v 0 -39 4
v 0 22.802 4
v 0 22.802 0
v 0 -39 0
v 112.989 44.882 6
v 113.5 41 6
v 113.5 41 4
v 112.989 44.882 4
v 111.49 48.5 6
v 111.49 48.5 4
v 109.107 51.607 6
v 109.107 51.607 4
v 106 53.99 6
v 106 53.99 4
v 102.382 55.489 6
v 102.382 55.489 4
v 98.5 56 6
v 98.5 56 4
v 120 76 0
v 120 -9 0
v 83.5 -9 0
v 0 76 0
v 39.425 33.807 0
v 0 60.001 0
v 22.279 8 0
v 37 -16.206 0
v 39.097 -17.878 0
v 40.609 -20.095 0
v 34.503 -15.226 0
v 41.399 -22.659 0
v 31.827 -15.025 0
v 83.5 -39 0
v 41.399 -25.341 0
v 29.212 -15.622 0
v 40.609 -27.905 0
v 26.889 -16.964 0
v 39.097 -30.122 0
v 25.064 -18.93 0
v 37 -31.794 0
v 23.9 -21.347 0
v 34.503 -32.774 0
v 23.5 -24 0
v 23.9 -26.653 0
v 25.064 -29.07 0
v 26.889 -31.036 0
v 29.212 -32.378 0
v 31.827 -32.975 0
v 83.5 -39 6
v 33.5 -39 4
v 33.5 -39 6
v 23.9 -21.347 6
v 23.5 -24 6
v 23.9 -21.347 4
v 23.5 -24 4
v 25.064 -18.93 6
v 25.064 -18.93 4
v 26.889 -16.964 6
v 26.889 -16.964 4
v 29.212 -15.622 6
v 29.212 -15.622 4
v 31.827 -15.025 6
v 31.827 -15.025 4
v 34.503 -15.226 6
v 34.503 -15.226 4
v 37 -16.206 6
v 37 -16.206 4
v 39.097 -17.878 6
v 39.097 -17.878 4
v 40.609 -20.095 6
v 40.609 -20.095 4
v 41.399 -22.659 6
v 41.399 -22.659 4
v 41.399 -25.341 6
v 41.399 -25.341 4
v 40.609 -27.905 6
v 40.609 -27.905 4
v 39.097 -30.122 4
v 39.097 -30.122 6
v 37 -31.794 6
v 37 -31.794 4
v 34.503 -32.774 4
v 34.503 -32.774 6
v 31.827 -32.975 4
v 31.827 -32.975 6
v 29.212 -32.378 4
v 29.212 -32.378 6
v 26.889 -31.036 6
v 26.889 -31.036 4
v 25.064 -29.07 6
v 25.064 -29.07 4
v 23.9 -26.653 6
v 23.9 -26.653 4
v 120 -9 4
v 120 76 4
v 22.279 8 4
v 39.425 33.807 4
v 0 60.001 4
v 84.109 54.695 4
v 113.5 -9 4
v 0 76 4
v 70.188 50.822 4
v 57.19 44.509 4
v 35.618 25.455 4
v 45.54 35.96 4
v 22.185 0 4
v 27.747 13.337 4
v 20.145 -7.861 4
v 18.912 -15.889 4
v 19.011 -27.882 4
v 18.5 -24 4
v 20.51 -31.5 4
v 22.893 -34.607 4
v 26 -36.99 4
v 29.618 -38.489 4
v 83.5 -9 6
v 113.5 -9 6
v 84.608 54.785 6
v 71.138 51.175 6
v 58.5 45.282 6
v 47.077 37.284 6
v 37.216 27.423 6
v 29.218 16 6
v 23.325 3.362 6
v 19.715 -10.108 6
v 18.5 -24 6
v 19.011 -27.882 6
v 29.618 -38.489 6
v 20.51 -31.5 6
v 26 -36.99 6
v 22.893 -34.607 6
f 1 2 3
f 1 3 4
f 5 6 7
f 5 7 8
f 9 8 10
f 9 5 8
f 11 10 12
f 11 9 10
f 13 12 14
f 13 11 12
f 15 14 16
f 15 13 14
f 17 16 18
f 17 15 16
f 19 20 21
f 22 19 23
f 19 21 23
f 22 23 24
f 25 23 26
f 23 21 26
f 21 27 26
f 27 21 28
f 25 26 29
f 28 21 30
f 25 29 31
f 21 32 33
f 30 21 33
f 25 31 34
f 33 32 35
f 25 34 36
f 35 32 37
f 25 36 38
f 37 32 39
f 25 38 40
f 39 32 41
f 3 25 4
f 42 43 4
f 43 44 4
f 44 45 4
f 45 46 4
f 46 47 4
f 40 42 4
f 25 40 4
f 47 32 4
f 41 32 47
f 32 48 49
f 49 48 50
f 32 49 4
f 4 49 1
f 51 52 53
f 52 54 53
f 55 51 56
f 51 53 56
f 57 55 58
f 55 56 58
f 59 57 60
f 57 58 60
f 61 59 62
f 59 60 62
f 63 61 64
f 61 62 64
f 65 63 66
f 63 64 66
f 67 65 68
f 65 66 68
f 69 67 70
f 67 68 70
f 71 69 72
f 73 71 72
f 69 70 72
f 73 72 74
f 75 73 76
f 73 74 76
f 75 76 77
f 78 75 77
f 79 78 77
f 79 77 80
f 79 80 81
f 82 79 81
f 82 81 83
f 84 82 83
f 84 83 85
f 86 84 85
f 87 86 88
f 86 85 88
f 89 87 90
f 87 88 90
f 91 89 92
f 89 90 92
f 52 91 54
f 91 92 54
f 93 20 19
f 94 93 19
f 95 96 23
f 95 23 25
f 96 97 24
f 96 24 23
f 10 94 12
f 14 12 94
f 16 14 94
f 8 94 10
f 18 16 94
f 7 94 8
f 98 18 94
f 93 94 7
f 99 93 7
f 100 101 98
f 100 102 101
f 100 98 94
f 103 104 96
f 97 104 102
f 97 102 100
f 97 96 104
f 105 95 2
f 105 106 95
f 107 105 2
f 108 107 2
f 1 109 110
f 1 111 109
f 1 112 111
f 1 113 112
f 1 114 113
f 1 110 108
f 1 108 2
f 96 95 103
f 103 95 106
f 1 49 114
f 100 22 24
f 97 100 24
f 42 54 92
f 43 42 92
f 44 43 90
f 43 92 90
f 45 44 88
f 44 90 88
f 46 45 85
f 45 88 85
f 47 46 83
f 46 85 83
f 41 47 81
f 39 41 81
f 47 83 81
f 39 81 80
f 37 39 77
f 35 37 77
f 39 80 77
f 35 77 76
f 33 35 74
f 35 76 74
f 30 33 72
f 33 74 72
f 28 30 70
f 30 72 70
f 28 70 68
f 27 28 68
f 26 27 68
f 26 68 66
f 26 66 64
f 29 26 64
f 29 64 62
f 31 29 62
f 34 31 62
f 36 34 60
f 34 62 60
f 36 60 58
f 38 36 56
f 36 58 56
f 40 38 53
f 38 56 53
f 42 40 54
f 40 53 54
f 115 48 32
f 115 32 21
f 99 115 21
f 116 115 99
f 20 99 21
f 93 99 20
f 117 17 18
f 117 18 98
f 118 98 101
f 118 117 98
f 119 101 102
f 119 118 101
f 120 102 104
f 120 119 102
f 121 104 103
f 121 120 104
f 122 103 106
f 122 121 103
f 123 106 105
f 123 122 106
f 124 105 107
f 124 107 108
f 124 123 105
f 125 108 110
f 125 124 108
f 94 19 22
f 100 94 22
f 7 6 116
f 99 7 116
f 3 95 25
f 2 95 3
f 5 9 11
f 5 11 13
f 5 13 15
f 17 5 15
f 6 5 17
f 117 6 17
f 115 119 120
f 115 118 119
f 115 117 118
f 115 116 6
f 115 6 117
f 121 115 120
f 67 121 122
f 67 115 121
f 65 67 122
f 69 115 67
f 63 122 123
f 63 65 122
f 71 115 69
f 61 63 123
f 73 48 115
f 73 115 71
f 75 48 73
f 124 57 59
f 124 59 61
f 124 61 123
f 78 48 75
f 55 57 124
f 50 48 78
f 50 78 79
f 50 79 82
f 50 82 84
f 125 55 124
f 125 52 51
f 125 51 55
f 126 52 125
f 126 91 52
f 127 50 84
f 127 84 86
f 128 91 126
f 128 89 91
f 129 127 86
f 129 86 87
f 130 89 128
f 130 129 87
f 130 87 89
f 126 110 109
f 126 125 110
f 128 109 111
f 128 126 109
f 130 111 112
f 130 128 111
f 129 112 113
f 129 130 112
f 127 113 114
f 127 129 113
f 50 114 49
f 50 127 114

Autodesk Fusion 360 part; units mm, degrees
sketch "Colour Detection Mechanism Platform" plane through (0, 0, 0) normal (0, 0, 1) x (1, 0, 0)
  line L0 (0, 0) -> (120, 0)
  line L1 (120, 0) -> (120, 76)
  line L2 (120, 76) -> (0, 76)
  line L3 (0, 76) -> (0, 0)
  dimension "d169" = 120
  dimension "d170" = 76
extrude "Extrude42" add sketch "Colour Detection Mechanism Platform" along normal blind 4
sketch "Smartie Path" plane through (0, 0, 4) normal (0, 0, 1) x (-1, 0, 0)
  line L0 (0, -76) -> (0, 0)
  line L1 (0, 0) -> (-120, 0)
  line L2 (-120, 0) -> (-120, -76)
  line L3 (-120, -76) -> (0, -76)
  circle A0 centre (-98.5, 24) radius 80
  line L4 (-98.5, 24) -> (-113.5, 24)
  line L5 (-113.5, 24) -> (-113.5, -56)
  line L6 (-113.5, -56) -> (-98.5, -56)
  line L7 (-98.5, -56) -> (-98.5, 24)
  line L8 (-98.5, 24) -> (-18.5, 24)
  line L9 (-18.5, 24) -> (-18.5, 39)
  line L10 (-18.5, 39) -> (-98.5, 39)
  line L11 (-98.5, 39) -> (-98.5, 24)
  line L12 (-98.5, 24) -> (-113.5, 24)
  line L13 (-113.5, 24) -> (-113.5, 39)
  line L14 (-113.5, 39) -> (-98.5, 39)
  line L15 (-98.5, 39) -> (-98.5, 24)
  circle A1 centre (-32.5, 24) radius 9
  dimension "d173" = 160
  dimension "d174" = 24
  dimension "d175" = 21.5
  dimension "d176" = 15
  dimension "d177" = 15
  dimension "d178" = 80
  dimension "d179" = 80
  dimension "d184" = 18
  dimension "d185" = 14
extrude "Extrude43" add sketch "Smartie Path" along normal blind 2 contours L1 A0 L7 | L1 A0 L7 L8 A1 | L1 A0 L5 L7 | L1 L4 L5 L7 L12 | A0 L8 L10 L11 L15 A1 | L4 L11 L12 L13 L14 L15
fillet "Fillet2" radius 15 2 edges at (19.9188, -39, 5) (113.5, 54.5812, 5)
extrude "Extrude44" add 1 faces at (89.4665, -20.5529, 4) along direction (0, 0, -1) blind 4
sketch "Servo Hole" plane through (0, 0, 6) normal (0, 0, 1) x (-1, 0, 0)
  circle A0 centre (-32.5, 24) radius 9
  arc A1 (-113.5, -41) -> (-98.5, -56) centre (-98.5, -41) ccw
  arc A2 (-98.5, -56) -> (-18.5, 24) centre (-98.5, 24) ccw
  arc A3 (-18.5, 24) -> (-33.5, 39) centre (-33.5, 24) ccw
  line L0 (-33.5, 39) -> (-113.5, 39)
  line L1 (-113.5, 39) -> (-113.5, -41)
  line L2 (-113.5, 39) -> (-83.5, 39)
  line L3 (-83.5, 39) -> (-83.5, 9)
  line L4 (-83.5, 9) -> (-113.5, 9)
  line L5 (-113.5, 9) -> (-113.5, 39)
  dimension "d188" = 30
  dimension "d189" = 30
extrude "Extrude45" cut sketch "Servo Hole" against normal blind 6 contours L0 L1 L2 L3 L4 L5
sketch "Colour Sensor Holder Hole" plane through (0, 0, 4) normal (0, 0, 1) x (-1, 0, 0)
  line L0 (-120, 0) -> (-120, -76)
  line L1 (-120, -76) -> (0, -76)
  line L2 (0, -76) -> (0, 0)
  line L3 (-113.5, 0) -> (-120, 0)
  arc A0 (-98.5, -56) -> (-22.1849, 0) centre (-98.5, 24) ccw
  arc A1 (-113.5, -41) -> (-98.5, -56) centre (-98.5, -41) ccw
  line L4 (-113.5, -41) -> (-113.5, 0)
  line L5 (0, -59.401) -> (-38.732, -33.6675)
  line L6 (0, -23.4021) -> (-22.139, -8.693)
  line L7 (-38.732, -33.6675) -> (-22.139, -8.693)
  line L8 (0, -60.0013) -> (-39.4252, -33.8073)
  line L9 (-39.4252, -33.8073) -> (-22.2788, -7.9998)
  line L10 (-22.2788, -7.9998) -> (0, -22.8018)
  line L11 (0, 0) -> (-22.1849, 0)
  dimension "d249" = 56.4
  dimension "d250" = 59.401
  dimension "d254" = 56.4
  dimension "d255" = 8.693
  dimension "d256" = 22.139
  dimension "d257" = 23.4021
  dimension "d258" = 38.732
  dimension "d261" = 0.5
  dimension "d262" = 0.5
  dimension "d263" = 0.5
extrude "Extrude58" cut sketch "Colour Sensor Holder Hole" against normal blind 4 contours L2 L5 L6 L7
extrude "Extrude59" cut sketch "Colour Sensor Holder Hole" against normal blind 4 contours L2 L5 L6 L7 L8 L9 L10
sketch "Platform Extension" plane through (0, 0, 4) normal (0, 0, 1) x (-1, 0, 0)
  line L0 (-22.2788, -7.9998) -> (0, -22.8018)
  line L1 (0, -22.8018) -> (0, 0)
  line L2 (0, 0) -> (-22.1849, 0)
  arc A0 (-98.5, -56) -> (-22.1849, 0) centre (-98.5, 24) ccw
  arc A1 (-113.5, -41) -> (-98.5, -56) centre (-98.5, -41) ccw
  line L3 (-113.5, -41) -> (-113.5, 0)
  line L4 (-120, 0) -> (-120, -76)
  line L5 (-120, -76) -> (0, -76)
  line L6 (0, -60.0013) -> (-39.4252, -33.8073)
  line L7 (-39.4252, -33.8073) -> (-22.2788, -7.9998)
  line L8 (-83.5, 9) -> (-113.5, 9)
  line L9 (-113.5, 9) -> (-113.5, -41)
  arc A2 (-113.5, -41) -> (-98.5, -56) centre (-98.5, -41) ccw
  arc A3 (-98.5, -56) -> (-18.5, 24) centre (-98.5, 24) ccw
  arc A4 (-18.5, 24) -> (-33.5, 39) centre (-33.5, 24) ccw
  line L10 (-33.5, 39) -> (-83.5, 39)
  line L11 (-83.5, 39) -> (-83.5, 9)
  circle A5 centre (-32.5, 24) radius 9
  line L12 (0, 0) -> (0, 39)
  line L13 (0, 39) -> (-33.5, 39)
  line L14 (-113.5, 0) -> (-120, 0)
  line L15 (0, -76) -> (0, -60.0013)
  line L16 (-113.5, 0) -> (-120, 0)
  line L17 (-120, 0) -> (-120, 9)
  line L18 (-120, 9) -> (-113.5, 9)
  line L19 (-113.5, 9) -> (-113.5, 0)
extrude "Extrude60" add sketch "Platform Extension" against normal blind 4 contours L2 A3 A4 L12 L13 | L9 L14 L16 L17 L18 L19
